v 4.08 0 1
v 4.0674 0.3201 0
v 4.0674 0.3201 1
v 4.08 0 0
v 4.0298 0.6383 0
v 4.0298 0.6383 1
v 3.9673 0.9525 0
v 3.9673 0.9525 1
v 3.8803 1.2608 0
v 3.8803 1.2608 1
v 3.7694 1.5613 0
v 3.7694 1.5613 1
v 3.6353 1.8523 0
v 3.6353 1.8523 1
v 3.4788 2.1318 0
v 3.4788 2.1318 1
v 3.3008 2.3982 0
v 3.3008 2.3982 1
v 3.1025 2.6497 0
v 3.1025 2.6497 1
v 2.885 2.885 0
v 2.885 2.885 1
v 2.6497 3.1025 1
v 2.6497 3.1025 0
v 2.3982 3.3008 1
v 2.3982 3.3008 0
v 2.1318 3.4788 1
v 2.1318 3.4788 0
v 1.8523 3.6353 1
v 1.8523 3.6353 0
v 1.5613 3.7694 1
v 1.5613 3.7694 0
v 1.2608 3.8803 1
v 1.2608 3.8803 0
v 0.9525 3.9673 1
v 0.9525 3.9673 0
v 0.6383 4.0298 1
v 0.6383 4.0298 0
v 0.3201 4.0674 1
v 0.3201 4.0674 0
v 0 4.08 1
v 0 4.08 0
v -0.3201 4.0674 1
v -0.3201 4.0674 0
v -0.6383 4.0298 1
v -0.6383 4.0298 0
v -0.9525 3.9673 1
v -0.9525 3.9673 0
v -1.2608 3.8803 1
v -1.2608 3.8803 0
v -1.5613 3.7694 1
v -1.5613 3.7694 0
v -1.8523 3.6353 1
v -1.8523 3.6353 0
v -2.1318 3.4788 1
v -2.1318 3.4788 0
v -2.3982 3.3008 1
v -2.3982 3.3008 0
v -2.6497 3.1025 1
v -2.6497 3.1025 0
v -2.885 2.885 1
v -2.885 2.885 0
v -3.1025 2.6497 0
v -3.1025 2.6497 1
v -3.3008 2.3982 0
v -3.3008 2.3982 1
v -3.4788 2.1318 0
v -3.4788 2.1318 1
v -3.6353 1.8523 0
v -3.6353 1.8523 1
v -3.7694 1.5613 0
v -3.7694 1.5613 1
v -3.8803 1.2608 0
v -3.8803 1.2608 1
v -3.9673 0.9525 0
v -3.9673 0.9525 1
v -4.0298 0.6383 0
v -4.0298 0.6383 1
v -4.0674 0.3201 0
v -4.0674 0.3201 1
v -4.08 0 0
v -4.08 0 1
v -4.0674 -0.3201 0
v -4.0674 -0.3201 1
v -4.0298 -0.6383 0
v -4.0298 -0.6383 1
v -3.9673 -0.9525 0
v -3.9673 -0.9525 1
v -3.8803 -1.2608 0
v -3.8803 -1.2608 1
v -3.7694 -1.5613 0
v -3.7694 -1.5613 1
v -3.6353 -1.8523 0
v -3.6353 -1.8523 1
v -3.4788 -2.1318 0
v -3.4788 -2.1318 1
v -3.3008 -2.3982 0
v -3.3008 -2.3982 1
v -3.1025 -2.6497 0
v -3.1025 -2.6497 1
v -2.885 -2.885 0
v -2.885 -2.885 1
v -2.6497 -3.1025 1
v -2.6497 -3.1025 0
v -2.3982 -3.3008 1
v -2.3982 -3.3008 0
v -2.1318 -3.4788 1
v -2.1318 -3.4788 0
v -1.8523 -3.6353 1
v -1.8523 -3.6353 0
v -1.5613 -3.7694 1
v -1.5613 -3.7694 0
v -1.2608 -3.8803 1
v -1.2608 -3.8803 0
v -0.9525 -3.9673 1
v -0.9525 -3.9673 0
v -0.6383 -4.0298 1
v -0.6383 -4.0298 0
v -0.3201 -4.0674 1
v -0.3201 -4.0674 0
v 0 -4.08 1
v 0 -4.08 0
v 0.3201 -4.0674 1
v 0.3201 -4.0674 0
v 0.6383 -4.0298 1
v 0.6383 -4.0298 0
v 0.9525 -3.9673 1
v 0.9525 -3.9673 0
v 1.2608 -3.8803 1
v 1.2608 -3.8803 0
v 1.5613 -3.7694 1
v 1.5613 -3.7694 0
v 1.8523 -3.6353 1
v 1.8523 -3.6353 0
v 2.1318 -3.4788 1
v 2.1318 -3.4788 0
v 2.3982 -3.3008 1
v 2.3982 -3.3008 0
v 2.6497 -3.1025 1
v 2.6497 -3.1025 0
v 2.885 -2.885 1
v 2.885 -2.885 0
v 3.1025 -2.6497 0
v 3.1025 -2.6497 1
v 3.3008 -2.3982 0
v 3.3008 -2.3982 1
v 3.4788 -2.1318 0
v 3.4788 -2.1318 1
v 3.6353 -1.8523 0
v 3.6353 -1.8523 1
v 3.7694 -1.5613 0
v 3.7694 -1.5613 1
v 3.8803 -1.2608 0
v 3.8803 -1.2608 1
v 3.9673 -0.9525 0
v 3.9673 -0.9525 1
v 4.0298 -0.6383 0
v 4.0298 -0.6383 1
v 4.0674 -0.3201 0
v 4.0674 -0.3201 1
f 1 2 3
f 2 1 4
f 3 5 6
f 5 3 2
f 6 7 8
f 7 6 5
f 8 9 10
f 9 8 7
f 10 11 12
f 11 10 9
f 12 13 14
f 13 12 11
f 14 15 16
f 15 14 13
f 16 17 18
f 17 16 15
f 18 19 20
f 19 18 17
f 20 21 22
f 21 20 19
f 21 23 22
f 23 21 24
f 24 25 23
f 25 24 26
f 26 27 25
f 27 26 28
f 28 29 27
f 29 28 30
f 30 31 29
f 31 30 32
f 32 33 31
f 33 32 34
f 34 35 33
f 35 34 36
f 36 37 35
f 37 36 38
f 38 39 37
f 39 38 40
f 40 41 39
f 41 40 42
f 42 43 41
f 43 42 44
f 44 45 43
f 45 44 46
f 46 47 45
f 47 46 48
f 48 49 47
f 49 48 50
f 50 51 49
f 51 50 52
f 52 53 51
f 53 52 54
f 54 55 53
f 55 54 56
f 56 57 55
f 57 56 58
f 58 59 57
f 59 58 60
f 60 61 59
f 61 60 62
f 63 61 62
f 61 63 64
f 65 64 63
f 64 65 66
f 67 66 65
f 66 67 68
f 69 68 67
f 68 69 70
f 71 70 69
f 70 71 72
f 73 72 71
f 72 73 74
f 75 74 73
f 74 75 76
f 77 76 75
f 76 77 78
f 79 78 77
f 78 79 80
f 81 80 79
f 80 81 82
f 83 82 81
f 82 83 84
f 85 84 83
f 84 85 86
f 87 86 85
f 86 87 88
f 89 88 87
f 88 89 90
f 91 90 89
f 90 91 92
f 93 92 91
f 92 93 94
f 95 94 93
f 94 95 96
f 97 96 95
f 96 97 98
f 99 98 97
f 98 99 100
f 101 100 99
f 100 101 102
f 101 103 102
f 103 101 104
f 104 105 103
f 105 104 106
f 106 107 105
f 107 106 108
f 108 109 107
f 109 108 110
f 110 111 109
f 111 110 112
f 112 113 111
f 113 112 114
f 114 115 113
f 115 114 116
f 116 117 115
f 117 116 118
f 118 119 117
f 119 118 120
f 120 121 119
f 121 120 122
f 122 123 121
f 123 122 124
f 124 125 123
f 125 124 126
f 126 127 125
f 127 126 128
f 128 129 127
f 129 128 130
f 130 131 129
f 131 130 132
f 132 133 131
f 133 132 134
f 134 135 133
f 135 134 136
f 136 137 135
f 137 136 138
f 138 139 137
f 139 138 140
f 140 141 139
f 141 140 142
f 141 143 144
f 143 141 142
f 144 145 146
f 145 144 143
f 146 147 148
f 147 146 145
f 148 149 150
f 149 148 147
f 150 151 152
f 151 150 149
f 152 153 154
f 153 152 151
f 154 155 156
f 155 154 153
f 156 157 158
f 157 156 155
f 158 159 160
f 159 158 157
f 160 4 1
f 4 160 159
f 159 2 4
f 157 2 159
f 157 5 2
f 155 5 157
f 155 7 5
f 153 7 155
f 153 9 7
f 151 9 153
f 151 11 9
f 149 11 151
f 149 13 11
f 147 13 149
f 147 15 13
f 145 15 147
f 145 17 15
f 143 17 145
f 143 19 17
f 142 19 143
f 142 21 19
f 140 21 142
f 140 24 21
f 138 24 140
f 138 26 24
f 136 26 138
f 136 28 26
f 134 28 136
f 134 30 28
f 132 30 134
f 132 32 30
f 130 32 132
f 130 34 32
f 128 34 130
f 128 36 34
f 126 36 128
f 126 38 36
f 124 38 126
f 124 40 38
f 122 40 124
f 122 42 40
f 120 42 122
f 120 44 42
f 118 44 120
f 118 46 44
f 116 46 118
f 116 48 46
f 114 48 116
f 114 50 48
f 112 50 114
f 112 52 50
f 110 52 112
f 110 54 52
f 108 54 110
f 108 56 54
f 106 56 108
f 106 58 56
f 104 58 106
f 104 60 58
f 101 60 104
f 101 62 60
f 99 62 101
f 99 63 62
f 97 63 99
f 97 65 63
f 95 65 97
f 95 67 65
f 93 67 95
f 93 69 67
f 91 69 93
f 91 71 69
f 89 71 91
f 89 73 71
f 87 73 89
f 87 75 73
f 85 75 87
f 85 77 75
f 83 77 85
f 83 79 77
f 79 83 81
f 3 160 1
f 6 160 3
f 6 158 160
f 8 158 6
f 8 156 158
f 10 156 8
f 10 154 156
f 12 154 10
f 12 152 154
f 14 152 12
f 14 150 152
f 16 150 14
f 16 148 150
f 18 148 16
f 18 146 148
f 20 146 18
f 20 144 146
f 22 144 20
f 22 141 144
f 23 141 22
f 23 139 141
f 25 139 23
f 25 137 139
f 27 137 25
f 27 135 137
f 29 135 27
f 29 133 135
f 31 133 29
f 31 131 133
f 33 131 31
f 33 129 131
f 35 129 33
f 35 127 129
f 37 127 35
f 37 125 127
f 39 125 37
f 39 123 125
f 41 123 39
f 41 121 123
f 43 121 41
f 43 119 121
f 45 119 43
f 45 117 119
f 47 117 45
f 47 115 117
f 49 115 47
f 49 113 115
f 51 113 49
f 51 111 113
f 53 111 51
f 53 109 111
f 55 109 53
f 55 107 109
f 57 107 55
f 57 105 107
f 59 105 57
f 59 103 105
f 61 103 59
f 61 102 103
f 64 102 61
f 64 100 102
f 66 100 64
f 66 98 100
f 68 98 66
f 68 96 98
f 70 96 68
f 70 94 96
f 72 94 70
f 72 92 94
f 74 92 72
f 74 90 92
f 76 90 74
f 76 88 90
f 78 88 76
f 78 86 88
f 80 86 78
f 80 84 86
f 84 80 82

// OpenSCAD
// Minor diameter (main body)
MinorDiameter = 11;
// Taper (body top diameter/bottom diameter). 1.0=no taper 0.6=heavy taper
Taper = 0.95; // [0.6:0.01:1.0]5


module VintageKnobACap(d, taper) {
    d2=d*taper;
    diameter = d2*0.85-0.5;
    cylinder(d=d*0.76-0.2, h=1, $fn=$fn*2);
}

$fn = $preview ? 15 : 40;
VintageKnobACap(d=MinorDiameter, taper=Taper);
